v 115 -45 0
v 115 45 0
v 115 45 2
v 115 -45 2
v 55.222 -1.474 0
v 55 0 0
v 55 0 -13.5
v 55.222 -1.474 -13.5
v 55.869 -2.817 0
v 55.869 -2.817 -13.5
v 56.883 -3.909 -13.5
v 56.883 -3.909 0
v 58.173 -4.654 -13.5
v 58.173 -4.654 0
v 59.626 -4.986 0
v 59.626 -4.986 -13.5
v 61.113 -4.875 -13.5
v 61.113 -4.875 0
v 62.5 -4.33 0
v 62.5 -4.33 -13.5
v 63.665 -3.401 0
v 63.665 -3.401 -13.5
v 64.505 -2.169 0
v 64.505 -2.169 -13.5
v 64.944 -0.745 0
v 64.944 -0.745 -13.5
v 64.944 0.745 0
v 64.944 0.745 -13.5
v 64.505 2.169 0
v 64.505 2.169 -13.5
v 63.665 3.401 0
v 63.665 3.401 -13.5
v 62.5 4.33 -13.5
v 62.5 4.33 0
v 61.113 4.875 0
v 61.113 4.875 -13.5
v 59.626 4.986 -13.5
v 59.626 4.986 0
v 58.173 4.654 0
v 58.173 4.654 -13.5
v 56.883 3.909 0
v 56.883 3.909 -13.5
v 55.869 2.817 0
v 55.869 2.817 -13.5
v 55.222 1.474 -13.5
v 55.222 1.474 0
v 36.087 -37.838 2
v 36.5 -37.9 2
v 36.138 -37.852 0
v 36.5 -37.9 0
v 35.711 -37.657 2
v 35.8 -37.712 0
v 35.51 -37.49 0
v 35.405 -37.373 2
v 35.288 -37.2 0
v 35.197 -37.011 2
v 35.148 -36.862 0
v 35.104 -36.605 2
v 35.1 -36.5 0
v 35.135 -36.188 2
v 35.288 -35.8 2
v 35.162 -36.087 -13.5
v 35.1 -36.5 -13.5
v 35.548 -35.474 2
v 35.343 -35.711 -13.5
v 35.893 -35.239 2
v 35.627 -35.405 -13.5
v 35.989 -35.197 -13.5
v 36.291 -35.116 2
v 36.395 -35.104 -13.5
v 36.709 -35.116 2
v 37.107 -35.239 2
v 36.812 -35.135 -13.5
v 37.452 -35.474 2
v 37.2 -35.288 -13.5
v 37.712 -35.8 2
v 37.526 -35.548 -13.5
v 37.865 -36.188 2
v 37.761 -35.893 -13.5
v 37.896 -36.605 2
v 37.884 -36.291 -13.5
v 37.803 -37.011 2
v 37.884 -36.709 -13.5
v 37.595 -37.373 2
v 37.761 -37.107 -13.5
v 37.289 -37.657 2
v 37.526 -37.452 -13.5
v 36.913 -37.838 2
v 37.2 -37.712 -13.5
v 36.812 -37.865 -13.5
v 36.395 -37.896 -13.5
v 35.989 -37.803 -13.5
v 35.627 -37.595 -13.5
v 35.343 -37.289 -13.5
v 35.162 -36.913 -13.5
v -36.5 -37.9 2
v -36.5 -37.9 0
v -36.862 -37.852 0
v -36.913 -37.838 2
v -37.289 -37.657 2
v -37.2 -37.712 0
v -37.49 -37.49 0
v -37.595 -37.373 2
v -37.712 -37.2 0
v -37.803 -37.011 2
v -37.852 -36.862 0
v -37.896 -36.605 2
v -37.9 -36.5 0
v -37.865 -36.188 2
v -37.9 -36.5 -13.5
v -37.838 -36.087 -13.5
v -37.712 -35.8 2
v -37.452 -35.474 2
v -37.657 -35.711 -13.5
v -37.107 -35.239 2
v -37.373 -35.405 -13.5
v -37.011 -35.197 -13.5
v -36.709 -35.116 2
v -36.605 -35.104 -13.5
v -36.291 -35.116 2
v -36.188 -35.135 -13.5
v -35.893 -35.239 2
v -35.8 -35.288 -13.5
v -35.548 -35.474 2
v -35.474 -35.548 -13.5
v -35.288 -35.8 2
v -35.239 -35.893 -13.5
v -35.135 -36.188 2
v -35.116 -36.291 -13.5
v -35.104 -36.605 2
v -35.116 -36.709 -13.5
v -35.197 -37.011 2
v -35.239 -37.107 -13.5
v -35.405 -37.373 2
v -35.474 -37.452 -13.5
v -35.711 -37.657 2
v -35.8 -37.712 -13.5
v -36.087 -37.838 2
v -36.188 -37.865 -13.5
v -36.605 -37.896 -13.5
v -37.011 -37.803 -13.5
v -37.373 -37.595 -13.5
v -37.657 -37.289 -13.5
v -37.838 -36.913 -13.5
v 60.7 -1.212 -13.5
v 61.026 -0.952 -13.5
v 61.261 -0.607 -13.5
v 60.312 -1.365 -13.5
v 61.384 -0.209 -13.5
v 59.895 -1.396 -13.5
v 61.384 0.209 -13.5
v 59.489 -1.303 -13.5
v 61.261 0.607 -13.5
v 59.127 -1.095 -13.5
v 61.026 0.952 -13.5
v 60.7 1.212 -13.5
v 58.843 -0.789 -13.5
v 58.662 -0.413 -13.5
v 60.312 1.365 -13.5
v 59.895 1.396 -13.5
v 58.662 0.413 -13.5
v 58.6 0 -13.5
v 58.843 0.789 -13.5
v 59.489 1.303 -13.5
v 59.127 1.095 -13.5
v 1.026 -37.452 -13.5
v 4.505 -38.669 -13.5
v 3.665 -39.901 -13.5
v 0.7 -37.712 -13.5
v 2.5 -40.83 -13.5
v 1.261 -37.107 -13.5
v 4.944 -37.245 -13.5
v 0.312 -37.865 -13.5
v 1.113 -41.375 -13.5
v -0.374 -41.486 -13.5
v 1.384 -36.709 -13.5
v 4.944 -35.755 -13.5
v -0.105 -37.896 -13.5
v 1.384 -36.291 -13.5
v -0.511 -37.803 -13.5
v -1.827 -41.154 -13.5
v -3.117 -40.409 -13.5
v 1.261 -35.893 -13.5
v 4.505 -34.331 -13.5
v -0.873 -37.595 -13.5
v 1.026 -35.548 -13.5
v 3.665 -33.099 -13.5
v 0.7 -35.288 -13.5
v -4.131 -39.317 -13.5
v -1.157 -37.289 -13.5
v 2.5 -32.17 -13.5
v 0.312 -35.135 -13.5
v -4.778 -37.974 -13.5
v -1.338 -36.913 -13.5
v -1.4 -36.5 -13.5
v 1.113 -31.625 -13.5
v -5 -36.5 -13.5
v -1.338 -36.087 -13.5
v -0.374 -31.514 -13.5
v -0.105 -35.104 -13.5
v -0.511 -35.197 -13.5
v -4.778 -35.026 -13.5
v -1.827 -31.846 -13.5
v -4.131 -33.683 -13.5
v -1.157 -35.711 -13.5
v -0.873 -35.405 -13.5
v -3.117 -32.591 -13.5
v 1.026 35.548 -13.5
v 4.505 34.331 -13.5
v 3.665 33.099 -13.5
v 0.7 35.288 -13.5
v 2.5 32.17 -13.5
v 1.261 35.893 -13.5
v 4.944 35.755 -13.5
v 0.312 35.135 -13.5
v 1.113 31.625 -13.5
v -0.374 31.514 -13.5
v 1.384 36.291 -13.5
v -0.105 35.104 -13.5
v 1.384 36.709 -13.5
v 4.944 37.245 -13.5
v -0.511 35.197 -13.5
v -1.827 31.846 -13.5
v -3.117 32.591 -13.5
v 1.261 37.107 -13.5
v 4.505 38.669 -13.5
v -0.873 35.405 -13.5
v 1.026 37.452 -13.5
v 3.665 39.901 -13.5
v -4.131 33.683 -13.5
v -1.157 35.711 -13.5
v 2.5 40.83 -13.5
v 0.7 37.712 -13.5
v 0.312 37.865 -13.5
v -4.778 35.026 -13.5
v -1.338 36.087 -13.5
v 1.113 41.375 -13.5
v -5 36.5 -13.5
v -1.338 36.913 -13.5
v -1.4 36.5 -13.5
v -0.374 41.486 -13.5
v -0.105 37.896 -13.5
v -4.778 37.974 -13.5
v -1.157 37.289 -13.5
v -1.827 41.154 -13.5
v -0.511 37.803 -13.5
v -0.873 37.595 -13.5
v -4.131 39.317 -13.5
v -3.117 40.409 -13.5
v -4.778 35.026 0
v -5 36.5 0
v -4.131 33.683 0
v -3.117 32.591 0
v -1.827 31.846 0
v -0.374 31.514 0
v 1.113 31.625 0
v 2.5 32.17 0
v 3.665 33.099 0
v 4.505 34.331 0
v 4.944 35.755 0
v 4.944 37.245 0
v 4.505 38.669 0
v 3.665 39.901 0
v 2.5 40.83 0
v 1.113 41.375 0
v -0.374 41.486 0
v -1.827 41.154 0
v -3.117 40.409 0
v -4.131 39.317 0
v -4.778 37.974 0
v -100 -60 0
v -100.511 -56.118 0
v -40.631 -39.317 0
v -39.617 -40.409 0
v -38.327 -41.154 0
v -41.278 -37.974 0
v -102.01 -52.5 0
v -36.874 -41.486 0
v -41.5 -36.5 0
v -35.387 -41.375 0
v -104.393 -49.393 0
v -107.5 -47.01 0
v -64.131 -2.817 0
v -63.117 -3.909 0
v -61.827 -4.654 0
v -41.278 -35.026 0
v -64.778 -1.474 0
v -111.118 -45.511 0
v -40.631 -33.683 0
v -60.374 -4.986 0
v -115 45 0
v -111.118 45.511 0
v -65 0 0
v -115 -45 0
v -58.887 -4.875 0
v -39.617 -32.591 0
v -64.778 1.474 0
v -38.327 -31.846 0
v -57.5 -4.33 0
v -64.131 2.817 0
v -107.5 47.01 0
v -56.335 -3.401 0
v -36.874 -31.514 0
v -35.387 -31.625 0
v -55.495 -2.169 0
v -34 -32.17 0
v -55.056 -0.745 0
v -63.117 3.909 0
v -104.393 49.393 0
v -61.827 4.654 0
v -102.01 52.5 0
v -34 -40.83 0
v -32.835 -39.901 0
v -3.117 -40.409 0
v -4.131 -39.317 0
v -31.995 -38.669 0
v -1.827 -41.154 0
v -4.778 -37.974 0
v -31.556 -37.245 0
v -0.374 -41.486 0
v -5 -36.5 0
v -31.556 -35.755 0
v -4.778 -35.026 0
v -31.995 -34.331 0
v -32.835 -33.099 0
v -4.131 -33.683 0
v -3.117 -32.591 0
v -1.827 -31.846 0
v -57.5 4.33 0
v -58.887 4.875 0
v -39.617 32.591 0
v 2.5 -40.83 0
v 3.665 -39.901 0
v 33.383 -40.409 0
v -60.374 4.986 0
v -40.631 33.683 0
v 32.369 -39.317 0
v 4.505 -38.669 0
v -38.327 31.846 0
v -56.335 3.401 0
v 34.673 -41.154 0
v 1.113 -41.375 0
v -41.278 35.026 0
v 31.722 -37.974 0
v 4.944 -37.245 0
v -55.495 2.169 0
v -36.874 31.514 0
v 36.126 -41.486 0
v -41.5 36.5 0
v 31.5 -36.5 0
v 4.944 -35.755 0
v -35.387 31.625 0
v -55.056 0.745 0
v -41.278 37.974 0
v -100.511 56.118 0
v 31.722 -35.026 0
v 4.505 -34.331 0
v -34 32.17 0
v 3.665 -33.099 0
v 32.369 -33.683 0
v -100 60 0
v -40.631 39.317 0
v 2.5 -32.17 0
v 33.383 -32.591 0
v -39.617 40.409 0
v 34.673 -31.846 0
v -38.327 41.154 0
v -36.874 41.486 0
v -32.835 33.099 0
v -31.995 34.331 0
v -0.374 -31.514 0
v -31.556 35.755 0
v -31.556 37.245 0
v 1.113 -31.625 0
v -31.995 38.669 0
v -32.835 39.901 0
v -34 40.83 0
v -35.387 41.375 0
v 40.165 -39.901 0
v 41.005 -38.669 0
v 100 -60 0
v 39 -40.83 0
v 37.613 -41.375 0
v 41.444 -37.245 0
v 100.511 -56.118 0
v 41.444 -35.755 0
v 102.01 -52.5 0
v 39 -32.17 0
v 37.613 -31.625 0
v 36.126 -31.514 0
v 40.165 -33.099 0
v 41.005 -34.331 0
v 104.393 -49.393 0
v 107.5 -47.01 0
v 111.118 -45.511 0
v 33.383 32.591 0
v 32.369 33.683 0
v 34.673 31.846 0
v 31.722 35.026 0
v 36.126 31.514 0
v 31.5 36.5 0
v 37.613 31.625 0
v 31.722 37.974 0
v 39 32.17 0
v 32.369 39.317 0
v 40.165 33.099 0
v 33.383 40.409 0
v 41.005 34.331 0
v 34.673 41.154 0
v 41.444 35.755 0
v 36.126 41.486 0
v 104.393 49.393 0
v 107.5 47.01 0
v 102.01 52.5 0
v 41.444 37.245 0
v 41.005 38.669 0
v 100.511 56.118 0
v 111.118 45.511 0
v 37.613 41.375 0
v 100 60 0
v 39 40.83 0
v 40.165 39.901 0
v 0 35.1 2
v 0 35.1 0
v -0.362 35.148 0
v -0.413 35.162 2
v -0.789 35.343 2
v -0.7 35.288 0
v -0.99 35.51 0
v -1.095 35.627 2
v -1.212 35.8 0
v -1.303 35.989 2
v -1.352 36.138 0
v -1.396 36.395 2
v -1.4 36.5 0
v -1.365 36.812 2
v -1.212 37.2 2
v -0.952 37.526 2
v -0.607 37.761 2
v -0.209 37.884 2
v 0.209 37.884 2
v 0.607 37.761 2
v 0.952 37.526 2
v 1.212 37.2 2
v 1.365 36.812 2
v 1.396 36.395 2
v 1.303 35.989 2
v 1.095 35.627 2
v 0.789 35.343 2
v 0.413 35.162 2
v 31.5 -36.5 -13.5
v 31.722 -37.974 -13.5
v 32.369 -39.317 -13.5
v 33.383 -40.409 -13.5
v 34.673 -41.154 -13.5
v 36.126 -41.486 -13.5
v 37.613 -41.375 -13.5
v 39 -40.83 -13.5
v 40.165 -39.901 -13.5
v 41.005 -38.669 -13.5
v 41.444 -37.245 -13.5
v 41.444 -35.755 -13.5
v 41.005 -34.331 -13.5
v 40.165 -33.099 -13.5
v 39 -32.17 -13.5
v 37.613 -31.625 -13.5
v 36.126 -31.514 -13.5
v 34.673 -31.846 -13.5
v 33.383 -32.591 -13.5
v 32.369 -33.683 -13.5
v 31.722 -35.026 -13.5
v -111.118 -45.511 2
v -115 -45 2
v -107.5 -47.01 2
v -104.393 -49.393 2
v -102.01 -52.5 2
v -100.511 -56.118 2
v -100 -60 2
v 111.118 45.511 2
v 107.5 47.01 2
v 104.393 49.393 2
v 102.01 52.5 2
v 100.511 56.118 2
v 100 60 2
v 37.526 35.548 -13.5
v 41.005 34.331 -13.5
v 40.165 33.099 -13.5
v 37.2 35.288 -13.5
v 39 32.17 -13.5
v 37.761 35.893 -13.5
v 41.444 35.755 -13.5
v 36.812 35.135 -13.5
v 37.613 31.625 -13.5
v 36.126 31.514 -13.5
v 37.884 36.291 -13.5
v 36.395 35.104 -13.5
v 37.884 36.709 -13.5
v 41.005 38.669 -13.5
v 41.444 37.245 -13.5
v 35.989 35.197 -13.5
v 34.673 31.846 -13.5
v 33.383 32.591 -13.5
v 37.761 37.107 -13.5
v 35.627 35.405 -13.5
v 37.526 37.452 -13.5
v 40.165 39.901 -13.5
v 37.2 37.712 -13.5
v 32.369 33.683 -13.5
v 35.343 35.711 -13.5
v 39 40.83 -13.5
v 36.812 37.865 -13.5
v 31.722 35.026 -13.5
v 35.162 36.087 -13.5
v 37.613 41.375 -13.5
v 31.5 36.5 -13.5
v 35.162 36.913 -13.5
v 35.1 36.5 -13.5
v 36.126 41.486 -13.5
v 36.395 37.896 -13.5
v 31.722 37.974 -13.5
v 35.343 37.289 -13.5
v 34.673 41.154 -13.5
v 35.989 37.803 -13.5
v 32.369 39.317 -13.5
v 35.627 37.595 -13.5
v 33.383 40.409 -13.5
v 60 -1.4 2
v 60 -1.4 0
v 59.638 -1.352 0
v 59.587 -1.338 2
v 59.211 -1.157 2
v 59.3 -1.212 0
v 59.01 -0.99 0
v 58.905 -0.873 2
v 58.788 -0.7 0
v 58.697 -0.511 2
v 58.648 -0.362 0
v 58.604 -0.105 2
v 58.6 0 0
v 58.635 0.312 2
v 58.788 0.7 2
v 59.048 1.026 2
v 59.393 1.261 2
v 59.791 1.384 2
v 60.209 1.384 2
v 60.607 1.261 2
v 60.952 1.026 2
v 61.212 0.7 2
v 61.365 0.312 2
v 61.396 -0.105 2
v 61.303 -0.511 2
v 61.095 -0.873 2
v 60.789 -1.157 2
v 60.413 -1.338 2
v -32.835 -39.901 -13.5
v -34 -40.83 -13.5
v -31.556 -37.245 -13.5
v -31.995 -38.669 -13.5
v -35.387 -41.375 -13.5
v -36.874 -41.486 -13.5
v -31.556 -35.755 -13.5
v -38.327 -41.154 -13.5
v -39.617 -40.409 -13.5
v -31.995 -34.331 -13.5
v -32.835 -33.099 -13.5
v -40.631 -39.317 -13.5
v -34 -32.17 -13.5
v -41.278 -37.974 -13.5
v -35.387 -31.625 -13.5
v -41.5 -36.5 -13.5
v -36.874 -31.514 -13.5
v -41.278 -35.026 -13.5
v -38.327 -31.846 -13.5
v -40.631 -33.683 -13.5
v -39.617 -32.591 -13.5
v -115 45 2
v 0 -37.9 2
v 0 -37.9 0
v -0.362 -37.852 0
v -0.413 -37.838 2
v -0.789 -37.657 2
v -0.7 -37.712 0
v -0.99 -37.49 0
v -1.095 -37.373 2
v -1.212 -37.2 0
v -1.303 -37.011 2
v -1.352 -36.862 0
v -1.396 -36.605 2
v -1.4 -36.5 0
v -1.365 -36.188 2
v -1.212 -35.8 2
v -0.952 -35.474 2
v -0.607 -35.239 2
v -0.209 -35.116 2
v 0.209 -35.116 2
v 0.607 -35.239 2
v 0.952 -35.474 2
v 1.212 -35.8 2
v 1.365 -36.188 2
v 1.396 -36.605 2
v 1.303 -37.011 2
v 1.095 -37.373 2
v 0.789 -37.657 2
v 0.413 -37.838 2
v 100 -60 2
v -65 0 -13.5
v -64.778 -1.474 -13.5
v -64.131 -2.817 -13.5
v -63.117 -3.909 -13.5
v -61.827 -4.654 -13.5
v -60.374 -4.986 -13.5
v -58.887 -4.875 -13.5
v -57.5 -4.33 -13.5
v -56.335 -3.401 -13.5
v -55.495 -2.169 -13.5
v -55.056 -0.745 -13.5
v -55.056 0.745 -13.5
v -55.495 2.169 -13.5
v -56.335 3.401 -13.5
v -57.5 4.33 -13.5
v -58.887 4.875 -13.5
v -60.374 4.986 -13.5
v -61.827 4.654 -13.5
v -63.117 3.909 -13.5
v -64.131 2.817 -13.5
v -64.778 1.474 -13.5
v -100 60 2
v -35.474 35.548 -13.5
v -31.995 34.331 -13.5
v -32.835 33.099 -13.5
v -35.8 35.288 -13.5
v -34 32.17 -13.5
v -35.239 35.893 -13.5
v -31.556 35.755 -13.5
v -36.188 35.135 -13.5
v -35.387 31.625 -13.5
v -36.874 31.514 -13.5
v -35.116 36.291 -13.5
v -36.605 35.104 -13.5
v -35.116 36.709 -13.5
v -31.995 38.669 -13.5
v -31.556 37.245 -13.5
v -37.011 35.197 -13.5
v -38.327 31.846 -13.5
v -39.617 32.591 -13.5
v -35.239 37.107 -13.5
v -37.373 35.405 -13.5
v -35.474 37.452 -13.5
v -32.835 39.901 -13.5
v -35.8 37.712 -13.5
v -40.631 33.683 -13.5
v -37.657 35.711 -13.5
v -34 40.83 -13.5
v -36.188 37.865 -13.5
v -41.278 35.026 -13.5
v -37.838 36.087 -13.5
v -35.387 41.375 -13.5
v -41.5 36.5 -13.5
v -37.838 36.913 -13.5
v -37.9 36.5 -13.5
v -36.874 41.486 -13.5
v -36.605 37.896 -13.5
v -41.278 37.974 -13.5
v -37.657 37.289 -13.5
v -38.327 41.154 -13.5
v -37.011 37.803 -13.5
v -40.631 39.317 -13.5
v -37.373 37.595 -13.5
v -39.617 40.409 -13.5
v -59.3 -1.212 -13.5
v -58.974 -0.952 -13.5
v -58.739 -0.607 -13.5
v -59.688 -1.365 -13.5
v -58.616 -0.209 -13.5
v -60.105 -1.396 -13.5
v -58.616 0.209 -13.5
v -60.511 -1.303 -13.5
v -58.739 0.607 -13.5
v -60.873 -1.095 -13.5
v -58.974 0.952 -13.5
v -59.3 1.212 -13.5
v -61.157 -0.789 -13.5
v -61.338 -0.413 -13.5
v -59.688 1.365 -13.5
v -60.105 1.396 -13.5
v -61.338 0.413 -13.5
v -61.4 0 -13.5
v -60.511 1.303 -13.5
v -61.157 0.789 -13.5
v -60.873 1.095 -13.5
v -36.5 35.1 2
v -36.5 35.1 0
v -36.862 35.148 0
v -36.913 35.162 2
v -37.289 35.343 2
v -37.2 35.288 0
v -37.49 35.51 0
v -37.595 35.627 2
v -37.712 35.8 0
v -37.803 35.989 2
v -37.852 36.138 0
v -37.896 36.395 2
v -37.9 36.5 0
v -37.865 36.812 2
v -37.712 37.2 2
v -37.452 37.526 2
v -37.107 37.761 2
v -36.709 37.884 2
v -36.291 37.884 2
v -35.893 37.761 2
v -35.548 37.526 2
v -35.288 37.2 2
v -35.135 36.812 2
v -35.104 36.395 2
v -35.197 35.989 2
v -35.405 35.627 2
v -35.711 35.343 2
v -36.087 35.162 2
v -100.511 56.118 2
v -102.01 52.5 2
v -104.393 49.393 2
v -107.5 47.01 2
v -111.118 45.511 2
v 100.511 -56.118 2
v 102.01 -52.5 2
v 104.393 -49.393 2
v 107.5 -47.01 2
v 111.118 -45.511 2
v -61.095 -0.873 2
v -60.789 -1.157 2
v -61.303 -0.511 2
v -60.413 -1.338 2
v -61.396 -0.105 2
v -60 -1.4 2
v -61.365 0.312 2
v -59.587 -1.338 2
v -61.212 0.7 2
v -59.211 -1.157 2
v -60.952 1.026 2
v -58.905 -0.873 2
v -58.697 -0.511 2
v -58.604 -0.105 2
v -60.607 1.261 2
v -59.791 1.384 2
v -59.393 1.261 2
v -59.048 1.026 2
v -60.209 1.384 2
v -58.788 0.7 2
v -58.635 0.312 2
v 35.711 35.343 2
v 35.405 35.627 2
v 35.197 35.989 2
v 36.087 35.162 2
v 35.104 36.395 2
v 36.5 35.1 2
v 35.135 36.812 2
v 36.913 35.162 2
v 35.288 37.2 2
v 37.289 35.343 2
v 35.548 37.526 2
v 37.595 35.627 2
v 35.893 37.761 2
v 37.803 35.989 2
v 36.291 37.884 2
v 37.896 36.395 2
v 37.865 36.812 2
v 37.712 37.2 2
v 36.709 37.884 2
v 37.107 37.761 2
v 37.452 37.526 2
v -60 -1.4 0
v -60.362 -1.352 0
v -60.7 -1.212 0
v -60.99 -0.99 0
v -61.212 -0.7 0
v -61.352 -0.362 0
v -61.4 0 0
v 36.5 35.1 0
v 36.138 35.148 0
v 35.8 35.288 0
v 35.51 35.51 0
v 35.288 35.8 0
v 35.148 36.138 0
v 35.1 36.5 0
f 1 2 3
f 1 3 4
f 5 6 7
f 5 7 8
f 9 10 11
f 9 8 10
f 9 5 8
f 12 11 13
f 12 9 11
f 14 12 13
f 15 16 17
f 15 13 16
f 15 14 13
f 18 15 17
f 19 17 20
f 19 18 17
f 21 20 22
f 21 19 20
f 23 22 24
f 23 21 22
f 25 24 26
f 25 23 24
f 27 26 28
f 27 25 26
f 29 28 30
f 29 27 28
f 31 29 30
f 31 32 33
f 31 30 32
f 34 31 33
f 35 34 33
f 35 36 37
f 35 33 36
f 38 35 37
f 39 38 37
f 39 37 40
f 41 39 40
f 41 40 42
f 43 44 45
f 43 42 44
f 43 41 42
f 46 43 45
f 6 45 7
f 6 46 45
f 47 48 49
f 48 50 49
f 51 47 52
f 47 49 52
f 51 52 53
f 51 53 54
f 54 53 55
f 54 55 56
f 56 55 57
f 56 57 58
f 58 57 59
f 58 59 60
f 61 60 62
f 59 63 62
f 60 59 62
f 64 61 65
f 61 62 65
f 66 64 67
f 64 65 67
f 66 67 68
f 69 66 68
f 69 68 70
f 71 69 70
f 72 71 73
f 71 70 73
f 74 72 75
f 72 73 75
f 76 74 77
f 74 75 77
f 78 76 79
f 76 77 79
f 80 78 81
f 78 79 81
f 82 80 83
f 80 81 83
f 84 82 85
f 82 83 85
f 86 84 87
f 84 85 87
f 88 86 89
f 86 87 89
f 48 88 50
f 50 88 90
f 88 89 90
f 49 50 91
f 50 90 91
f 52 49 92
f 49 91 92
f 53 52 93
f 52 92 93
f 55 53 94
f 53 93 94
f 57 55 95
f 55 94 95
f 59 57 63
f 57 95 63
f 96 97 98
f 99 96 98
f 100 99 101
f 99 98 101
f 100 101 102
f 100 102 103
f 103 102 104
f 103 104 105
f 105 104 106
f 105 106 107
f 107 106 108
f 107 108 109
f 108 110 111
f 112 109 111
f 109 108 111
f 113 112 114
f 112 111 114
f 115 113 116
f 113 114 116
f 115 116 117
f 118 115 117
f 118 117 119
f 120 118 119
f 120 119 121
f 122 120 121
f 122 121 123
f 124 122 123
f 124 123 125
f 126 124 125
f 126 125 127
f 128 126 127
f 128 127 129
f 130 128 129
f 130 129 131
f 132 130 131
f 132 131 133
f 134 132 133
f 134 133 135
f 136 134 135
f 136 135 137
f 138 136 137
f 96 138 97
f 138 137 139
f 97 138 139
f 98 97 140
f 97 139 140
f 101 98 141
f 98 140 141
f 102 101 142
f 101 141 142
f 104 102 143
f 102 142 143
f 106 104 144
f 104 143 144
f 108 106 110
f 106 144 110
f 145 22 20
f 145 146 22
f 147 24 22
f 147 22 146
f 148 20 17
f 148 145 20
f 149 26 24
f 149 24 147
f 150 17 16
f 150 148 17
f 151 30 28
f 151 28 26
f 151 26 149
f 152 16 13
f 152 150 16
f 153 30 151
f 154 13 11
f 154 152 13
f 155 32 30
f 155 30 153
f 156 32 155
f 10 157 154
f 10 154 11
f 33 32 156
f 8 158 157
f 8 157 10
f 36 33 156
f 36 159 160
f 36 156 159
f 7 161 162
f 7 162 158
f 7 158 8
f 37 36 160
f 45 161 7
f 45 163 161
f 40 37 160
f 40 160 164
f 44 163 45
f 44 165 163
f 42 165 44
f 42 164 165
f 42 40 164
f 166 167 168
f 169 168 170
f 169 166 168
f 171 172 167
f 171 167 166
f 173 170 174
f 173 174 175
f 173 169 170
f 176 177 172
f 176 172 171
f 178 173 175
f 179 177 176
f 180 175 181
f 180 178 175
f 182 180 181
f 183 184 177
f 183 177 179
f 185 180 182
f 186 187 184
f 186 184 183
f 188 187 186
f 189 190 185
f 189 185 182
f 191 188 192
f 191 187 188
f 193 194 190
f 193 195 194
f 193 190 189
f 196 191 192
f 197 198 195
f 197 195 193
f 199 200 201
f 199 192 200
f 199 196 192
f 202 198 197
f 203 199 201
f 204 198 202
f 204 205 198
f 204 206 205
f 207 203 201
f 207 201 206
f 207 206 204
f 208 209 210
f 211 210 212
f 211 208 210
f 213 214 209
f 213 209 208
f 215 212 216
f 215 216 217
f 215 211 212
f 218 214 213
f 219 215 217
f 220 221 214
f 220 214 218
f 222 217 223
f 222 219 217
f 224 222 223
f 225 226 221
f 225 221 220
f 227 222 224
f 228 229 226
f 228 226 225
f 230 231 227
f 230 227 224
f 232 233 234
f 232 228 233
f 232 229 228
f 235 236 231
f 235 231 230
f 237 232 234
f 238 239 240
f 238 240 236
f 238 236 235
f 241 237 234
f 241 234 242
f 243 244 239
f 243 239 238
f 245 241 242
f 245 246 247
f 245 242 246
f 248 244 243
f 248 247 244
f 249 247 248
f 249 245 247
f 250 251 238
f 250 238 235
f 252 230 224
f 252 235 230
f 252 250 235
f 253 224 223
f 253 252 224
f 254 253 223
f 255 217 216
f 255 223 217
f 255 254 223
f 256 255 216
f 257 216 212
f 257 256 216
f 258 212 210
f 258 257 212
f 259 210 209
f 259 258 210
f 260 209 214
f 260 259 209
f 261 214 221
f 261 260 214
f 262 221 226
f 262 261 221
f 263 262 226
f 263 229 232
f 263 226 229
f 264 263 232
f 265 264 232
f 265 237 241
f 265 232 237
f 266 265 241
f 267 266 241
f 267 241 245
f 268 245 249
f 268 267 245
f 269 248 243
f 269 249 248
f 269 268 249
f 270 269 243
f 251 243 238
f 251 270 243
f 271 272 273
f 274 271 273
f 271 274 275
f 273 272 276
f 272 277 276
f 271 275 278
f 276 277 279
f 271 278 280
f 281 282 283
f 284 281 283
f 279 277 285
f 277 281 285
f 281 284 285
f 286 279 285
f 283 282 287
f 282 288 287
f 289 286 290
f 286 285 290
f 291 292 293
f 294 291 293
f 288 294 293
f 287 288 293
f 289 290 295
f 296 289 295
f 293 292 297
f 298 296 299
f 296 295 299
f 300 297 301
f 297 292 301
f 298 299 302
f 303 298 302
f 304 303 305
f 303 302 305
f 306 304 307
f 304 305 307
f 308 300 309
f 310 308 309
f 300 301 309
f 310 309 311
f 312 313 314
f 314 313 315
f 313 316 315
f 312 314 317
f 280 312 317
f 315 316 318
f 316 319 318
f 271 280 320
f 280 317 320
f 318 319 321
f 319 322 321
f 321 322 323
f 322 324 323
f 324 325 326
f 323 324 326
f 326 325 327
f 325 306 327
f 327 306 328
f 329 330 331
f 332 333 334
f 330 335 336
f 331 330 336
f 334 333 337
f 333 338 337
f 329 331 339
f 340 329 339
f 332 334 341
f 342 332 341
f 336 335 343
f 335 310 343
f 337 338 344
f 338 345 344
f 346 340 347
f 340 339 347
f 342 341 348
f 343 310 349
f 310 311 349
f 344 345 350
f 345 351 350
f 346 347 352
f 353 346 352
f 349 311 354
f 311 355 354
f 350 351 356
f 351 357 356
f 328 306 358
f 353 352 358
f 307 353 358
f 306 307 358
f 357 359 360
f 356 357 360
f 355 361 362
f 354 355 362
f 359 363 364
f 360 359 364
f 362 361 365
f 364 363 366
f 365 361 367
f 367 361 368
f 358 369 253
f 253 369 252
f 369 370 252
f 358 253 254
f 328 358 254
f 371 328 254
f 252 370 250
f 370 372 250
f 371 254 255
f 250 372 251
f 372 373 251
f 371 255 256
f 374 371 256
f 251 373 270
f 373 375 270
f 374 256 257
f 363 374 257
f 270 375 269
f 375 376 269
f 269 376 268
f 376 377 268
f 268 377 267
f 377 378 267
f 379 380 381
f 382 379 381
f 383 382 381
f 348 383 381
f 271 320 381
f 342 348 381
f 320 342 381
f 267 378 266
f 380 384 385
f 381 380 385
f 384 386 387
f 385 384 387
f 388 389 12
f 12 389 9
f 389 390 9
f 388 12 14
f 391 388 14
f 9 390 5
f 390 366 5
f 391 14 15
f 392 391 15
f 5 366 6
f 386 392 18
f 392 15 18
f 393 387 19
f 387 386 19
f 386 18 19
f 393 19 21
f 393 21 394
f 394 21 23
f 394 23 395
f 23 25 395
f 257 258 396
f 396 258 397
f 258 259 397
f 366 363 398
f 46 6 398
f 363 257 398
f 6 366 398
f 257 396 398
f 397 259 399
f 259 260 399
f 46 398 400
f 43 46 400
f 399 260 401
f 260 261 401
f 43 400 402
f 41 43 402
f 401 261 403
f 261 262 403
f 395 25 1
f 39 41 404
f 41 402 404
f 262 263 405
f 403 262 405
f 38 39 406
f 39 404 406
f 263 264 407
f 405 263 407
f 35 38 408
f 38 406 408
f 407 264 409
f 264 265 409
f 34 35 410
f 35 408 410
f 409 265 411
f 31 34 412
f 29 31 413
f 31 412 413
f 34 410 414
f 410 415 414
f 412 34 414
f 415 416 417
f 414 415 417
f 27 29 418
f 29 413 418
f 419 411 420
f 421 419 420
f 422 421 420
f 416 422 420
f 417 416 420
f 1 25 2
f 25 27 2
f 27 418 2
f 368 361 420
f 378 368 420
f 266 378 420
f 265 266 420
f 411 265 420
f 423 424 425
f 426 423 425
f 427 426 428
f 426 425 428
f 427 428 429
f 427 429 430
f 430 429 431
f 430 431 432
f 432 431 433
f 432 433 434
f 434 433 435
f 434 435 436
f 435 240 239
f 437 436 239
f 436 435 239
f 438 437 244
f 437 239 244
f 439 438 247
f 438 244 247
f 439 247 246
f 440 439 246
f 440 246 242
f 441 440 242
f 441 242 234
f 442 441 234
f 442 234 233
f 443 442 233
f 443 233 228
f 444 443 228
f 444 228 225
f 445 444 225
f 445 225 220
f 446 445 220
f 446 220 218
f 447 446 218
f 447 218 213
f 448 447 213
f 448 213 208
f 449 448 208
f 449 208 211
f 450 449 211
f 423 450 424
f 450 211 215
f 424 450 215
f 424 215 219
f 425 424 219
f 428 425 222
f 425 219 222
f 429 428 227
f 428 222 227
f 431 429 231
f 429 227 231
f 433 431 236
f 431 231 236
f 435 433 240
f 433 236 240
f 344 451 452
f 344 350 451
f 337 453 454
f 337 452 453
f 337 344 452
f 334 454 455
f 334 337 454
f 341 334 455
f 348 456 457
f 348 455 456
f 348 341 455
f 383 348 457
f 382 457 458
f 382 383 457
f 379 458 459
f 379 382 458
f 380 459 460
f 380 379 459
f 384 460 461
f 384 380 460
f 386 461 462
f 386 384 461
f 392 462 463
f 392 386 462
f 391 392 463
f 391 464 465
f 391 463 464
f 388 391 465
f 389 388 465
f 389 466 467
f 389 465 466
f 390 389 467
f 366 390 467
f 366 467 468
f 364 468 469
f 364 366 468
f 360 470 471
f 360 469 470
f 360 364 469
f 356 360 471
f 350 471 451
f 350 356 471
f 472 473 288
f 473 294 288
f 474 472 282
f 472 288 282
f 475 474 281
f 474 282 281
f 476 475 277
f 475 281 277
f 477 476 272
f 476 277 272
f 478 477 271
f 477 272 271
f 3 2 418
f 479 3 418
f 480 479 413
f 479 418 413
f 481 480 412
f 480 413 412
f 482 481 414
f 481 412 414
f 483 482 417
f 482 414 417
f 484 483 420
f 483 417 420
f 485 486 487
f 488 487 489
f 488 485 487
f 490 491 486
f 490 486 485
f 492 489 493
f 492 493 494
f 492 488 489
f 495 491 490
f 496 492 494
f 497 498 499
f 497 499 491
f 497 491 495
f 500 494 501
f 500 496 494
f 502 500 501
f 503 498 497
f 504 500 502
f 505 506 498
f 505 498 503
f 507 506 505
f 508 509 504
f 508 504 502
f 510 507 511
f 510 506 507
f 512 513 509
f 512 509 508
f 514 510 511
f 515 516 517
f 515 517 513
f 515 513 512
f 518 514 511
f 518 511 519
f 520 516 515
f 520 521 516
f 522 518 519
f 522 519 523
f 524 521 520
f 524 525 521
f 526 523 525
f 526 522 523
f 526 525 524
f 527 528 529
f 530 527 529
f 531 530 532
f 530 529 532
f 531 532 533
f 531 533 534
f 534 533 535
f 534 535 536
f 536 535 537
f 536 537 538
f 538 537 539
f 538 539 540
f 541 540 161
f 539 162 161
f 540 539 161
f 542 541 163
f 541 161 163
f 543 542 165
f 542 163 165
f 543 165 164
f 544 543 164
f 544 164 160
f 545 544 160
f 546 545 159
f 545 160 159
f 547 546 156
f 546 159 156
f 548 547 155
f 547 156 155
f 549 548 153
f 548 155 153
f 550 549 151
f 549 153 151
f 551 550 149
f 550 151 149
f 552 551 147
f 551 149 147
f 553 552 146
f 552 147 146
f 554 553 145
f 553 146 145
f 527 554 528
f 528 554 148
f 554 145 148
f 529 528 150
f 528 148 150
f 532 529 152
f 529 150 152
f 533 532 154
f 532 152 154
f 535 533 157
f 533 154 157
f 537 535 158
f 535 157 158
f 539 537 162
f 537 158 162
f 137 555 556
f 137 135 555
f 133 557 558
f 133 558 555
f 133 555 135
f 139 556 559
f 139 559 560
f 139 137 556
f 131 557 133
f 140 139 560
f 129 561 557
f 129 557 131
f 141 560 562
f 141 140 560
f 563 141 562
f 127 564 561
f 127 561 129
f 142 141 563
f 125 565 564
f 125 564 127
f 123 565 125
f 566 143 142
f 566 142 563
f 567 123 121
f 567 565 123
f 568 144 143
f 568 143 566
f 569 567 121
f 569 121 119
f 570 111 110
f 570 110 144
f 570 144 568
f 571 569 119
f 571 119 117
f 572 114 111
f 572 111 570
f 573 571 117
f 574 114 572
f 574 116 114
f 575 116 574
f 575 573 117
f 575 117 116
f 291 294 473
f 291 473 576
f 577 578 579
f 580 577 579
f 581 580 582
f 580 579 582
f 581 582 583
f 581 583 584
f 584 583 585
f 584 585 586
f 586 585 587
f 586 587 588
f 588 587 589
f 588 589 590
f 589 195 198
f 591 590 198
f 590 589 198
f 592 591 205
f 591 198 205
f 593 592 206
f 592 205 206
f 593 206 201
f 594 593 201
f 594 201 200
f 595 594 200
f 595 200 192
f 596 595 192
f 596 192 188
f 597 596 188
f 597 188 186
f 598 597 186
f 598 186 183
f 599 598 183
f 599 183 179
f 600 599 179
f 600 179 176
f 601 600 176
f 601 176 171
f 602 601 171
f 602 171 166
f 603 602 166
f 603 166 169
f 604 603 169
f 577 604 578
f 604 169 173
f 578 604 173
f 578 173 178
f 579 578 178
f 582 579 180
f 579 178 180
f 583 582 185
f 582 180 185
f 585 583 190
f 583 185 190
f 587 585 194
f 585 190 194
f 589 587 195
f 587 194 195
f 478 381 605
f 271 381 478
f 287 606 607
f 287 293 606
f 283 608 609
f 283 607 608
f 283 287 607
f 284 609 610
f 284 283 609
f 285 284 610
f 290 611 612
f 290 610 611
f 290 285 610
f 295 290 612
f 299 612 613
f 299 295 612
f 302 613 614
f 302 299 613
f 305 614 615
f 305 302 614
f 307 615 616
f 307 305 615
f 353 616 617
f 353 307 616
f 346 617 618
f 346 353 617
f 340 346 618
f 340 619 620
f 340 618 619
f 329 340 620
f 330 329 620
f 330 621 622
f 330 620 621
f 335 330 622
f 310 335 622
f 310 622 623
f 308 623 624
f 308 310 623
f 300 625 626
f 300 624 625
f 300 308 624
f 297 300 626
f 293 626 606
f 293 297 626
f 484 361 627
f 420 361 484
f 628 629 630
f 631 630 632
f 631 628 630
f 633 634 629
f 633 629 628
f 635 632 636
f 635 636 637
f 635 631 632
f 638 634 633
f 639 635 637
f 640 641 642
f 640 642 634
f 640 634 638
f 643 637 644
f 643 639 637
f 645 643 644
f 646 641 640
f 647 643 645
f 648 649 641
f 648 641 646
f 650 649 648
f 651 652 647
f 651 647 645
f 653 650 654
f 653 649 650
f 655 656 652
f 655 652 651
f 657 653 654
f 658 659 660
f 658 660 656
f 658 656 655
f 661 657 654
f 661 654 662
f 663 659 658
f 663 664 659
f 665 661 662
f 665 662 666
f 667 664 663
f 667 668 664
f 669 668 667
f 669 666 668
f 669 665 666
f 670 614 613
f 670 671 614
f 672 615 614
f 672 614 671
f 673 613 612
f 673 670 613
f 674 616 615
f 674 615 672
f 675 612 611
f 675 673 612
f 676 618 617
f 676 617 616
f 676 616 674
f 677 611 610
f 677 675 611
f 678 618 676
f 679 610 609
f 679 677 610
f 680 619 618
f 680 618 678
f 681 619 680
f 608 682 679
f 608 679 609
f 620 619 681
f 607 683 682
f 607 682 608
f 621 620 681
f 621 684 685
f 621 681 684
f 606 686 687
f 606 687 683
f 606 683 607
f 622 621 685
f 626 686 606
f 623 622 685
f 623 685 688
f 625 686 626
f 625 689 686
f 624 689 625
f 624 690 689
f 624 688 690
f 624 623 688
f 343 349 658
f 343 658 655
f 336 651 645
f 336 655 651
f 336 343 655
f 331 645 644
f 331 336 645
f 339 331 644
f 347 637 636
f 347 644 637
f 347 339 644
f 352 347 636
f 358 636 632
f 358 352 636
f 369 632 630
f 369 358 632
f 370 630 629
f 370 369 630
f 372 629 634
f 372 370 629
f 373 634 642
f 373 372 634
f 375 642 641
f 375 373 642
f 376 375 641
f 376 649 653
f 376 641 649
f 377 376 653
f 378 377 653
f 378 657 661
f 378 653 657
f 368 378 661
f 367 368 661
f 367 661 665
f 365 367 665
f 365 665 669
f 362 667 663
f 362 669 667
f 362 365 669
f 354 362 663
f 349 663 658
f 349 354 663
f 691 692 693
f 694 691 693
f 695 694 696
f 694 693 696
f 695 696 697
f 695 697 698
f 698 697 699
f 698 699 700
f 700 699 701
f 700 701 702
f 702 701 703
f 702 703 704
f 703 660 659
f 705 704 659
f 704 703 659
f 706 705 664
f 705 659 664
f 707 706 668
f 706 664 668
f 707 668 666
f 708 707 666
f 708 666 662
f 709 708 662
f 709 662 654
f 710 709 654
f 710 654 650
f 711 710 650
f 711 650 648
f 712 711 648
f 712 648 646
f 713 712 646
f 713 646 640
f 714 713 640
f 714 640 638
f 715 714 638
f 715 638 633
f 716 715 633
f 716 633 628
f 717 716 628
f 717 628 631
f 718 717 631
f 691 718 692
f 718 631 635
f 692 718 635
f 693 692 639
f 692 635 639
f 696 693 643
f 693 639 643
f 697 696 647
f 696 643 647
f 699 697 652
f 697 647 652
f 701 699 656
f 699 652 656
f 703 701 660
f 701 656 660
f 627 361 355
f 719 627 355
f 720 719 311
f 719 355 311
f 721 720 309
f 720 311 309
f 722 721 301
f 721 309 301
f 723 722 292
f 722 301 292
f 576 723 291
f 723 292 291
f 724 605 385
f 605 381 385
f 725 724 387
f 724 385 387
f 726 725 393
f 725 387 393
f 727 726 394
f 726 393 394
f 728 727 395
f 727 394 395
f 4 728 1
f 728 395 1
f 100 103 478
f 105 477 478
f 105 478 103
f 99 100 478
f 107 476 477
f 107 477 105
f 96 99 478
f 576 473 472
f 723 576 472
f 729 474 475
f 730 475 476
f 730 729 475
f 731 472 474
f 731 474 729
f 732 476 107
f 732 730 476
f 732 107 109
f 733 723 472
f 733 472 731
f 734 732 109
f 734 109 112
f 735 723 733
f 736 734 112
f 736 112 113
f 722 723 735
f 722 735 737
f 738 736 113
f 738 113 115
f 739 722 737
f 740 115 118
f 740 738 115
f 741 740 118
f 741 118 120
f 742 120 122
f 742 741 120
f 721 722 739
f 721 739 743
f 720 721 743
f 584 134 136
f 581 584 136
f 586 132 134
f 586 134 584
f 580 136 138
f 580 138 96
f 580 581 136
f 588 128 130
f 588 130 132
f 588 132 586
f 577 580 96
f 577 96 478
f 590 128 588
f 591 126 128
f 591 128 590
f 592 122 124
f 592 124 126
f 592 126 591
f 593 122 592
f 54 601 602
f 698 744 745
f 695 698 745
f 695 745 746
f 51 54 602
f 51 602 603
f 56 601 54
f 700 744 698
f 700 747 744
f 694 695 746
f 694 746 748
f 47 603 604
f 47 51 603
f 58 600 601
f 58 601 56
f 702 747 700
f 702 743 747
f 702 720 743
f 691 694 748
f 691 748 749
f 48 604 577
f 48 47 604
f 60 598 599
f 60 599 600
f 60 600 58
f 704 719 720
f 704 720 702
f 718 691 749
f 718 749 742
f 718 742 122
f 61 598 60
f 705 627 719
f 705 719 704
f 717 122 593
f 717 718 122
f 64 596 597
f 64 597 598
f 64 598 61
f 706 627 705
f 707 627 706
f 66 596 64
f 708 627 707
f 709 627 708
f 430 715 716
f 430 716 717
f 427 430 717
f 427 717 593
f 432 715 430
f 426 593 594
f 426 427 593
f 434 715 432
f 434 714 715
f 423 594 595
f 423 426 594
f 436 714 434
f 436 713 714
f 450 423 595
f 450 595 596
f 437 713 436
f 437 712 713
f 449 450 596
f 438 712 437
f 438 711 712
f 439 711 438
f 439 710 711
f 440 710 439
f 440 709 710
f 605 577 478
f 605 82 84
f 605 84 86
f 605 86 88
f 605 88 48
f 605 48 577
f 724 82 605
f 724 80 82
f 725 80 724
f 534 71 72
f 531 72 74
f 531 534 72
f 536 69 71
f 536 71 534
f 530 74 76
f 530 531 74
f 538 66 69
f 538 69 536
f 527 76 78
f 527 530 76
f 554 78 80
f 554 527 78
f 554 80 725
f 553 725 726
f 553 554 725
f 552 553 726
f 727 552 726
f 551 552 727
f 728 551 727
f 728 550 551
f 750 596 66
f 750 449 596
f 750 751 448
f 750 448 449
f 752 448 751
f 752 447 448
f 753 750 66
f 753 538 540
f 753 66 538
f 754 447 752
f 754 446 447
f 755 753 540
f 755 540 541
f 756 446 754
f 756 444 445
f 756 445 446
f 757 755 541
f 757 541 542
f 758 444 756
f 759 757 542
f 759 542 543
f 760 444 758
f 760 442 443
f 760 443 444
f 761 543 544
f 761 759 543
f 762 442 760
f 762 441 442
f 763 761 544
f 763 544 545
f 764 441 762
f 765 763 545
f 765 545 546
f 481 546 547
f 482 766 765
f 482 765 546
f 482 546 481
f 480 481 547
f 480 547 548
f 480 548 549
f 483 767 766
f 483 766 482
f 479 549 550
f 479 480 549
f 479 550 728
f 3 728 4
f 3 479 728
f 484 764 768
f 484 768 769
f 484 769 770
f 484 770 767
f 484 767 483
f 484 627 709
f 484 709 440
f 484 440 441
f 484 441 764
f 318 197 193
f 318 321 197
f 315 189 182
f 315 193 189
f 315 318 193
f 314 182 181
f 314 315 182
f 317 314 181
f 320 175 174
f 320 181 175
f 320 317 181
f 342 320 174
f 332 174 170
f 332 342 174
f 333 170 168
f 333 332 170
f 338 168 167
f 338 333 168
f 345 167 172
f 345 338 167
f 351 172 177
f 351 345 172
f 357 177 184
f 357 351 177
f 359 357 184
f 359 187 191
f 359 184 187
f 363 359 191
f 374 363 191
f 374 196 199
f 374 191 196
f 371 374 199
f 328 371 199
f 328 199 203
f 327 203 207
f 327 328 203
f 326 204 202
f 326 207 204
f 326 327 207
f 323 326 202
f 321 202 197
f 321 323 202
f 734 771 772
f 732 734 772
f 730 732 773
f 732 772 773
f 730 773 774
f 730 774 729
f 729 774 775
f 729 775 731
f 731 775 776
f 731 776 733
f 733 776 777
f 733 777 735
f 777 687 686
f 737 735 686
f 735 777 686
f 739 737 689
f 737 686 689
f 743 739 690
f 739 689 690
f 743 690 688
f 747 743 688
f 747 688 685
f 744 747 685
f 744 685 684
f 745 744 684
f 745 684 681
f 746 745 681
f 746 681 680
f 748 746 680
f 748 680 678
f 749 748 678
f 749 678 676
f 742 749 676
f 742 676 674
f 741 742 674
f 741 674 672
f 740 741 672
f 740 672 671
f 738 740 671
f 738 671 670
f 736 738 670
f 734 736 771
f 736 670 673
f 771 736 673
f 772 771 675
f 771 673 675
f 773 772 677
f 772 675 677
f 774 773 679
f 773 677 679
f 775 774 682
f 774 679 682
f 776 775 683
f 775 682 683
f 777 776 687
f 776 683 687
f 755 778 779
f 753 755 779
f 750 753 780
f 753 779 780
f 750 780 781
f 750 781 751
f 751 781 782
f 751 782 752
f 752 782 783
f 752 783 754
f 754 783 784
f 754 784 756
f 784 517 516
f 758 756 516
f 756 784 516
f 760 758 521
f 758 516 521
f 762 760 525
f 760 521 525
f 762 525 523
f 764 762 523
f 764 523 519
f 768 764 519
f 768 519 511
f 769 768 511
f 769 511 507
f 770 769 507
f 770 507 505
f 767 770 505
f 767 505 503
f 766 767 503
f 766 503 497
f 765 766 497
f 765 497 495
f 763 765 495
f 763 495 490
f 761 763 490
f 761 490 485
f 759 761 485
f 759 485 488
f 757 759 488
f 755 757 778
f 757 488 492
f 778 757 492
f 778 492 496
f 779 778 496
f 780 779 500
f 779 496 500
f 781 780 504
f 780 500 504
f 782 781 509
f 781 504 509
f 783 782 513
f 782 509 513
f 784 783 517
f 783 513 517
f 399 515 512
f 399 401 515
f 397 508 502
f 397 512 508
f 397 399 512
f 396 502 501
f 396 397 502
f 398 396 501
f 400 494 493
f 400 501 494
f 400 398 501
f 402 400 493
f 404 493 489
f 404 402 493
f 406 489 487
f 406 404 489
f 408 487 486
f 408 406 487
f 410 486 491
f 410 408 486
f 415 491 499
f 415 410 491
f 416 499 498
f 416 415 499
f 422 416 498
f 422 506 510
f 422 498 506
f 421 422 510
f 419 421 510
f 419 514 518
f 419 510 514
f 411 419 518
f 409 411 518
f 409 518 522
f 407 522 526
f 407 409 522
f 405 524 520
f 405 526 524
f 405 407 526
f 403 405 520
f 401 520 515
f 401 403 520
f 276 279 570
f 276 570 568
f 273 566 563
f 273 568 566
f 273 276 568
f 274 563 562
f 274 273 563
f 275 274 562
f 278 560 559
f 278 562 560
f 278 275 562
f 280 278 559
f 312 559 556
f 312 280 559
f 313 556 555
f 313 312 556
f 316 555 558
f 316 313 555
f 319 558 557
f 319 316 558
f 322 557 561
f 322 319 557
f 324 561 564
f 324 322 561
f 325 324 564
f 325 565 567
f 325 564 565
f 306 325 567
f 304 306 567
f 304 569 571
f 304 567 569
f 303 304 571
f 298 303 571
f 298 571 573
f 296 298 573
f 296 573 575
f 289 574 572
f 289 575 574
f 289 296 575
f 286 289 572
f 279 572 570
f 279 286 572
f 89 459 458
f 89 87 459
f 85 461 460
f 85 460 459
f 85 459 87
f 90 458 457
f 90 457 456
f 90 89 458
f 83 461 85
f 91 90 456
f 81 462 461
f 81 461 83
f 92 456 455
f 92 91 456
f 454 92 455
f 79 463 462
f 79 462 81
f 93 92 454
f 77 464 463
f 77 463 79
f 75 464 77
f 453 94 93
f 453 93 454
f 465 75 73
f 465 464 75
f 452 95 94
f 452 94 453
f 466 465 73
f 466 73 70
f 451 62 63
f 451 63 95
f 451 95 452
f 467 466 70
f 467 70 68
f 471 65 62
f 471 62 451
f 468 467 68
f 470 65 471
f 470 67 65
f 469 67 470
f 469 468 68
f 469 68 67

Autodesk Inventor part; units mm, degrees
ref_plane "YZ Plane" through (0, 0, 0) normal (1, 0, 0) x (0, 1, 0)
ref_plane "XZ Plane" through (0, 0, 0) normal (0, 1, 0) x (-1, 0, 0)
ref_plane "XY Plane" through (0, 0, 0) normal (0, 0, 1) x (1, 0, 0)
sketch "Skizze1" plane through (0, 0, 0) normal (0, 0, 1) x (1, 0, 0)
  line L0 (115, -60) -> (-115, -60)
  line L1 (-115, -60) -> (-115, 60)
  line L2 (-115, 60) -> (115, 60)
  line L3 (115, 60) -> (115, -60)
  line L4 (115, -60) -> (-115, 60) construction
  line L5 (-115, -60) -> (115, 60) construction
  circle A0 centre (-115, 60) radius 15
  circle A1 centre (115, 60) radius 15
  circle A2 centre (115, -60) radius 15
  circle A3 centre (-115, -60) radius 15
  point P0 (0, 0)
  point P1 (-115, -45)
  point P2 (-100, -60)
  point P3 (100, -60)
  point P4 (115, -45)
  point P5 (115, 45)
  point P6 (100, 60)
  point P7 (-100, 60)
  point P8 (-115, 45)
  dimension "d0" = 230
  dimension "d1" = 120
  dimension "d2" = 30
  dimension "d3" = 30
  dimension "d4" = 30
  dimension "d5" = 30
extrude "Extrusion1" add sketch "Skizze1" along normal blind 2 contours A3 L1 A0 L2 A1 L3 A2 L0
sketch "Skizze2" plane through (0, 0, 2) normal (0, 0, 1) x (1, 0, 0)
  line L0 (36.5, -36.5) -> (-36.5, -36.5)
  line L1 (-36.5, -36.5) -> (-36.5, 36.5)
  line L2 (-36.5, 36.5) -> (36.5, 36.5)
  line L3 (36.5, 36.5) -> (36.5, -36.5)
  line L4 (36.5, -36.5) -> (-36.5, 36.5) construction
  line L5 (-36.5, -36.5) -> (36.5, 36.5) construction
  point P0 (0, 0)
  point P1 (0, 36.5)
  point P2 (0, -36.5)
  point P3 (60, 0)
  point P4 (-60, 0)
  dimension "d8" = 73
  dimension "d9" = 73
  dimension "d25" = 23.5
  dimension "d26" = 23.5
hole "Bohrung1" at (0, 36.5, 2) at (0, -36.5, 2) at (-36.5, -36.5, 2) at (-36.5, 36.5, 2) at (36.5, 36.5, 2) at (36.5, -36.5, 2) at (-60, 0, 2) at (60, 0, 2) direction (0, 0, -1) diameter 2.8 end through all
sketch "Skizze3" plane through (0, 0, 0) normal (0, 0, -1) x (-1, 0, 0)
  circle A0 centre (-36.5, -36.5) radius 1.4 projected
  circle A1 centre (-36.5, 36.5) radius 1.4 projected
  circle A2 centre (36.5, 36.5) radius 1.4 projected
  circle A3 centre (36.5, -36.5) radius 1.4 projected
  circle A4 centre (0, -36.5) radius 1.4 projected
  circle A5 centre (0, 36.5) radius 1.4 projected
  line L0 (100, -60) -> (-100, -60) projected
  arc A6 (115, -45) -> (100, -60) centre (115, -60) ccw projected
  line L1 (115, 45) -> (115, -45) projected
  arc A7 (100, 60) -> (115, 45) centre (115, 60) ccw projected
  line L2 (-100, 60) -> (100, 60) projected
  arc A8 (-115, 45) -> (-100, 60) centre (-115, 60) ccw projected
  line L3 (-115, -45) -> (-115, 45) projected
  arc A9 (-100, -60) -> (-115, -45) centre (-115, -60) ccw projected
  circle A10 centre (36.5, -36.5) radius 5
  circle A11 centre (0, -36.5) radius 5
  circle A12 centre (-36.5, -36.5) radius 5
  circle A13 centre (-36.5, 36.5) radius 5
  circle A14 centre (0, 36.5) radius 5
  circle A15 centre (36.5, 36.5) radius 5
  circle A16 centre (-60, 0) radius 1.4 projected
  circle A17 centre (60, 0) radius 1.4 projected
  circle A18 centre (-36.5, -36.5) radius 1.4 projected
  circle A19 centre (-36.5, 36.5) radius 1.4 projected
  circle A20 centre (36.5, 36.5) radius 1.4 projected
  circle A21 centre (36.5, -36.5) radius 1.4 projected
  circle A22 centre (0, -36.5) radius 1.4 projected
  circle A23 centre (0, 36.5) radius 1.4 projected
  line L4 (100, -60) -> (-100, -60) projected
  arc A24 (115, -45) -> (100, -60) centre (115, -60) ccw projected
  line L5 (115, 45) -> (115, -45) projected
  arc A25 (100, 60) -> (115, 45) centre (115, 60) ccw projected
  line L6 (-100, 60) -> (100, 60) projected
  arc A26 (-115, 45) -> (-100, 60) centre (-115, 60) ccw projected
  line L7 (-115, -45) -> (-115, 45) projected
  arc A27 (-100, -60) -> (-115, -45) centre (-115, -60) ccw projected
  circle A28 centre (60, 0) radius 5
  circle A29 centre (-60, 0) radius 5
  point P0 (0, 0)
  dimension "d17" = 10
  dimension "d18" = 10
  dimension "d19" = 10
  dimension "d20" = 10
  dimension "d21" = 10
  dimension "d22" = 10
  dimension "d27" = 10
  dimension "d28" = 10
extrude "Extrusion2" add sketch "Skizze3" along normal blind 13.5 contours A10 | A11 | A12 | A13 | A14 | A15 | A28 | A29
ref_plane "Arbeitsebene1" through (-100, 0, 0) normal (0, 1, 0) x (1, 0, 0)
ref_plane "Arbeitsebene2" through (0, -45, 0) normal (-1, 0, 0) x (0, 0, 1)
properties part number "00_ElectroWallbox_Tpelectric_130x220x140_IP67_Inlet"
